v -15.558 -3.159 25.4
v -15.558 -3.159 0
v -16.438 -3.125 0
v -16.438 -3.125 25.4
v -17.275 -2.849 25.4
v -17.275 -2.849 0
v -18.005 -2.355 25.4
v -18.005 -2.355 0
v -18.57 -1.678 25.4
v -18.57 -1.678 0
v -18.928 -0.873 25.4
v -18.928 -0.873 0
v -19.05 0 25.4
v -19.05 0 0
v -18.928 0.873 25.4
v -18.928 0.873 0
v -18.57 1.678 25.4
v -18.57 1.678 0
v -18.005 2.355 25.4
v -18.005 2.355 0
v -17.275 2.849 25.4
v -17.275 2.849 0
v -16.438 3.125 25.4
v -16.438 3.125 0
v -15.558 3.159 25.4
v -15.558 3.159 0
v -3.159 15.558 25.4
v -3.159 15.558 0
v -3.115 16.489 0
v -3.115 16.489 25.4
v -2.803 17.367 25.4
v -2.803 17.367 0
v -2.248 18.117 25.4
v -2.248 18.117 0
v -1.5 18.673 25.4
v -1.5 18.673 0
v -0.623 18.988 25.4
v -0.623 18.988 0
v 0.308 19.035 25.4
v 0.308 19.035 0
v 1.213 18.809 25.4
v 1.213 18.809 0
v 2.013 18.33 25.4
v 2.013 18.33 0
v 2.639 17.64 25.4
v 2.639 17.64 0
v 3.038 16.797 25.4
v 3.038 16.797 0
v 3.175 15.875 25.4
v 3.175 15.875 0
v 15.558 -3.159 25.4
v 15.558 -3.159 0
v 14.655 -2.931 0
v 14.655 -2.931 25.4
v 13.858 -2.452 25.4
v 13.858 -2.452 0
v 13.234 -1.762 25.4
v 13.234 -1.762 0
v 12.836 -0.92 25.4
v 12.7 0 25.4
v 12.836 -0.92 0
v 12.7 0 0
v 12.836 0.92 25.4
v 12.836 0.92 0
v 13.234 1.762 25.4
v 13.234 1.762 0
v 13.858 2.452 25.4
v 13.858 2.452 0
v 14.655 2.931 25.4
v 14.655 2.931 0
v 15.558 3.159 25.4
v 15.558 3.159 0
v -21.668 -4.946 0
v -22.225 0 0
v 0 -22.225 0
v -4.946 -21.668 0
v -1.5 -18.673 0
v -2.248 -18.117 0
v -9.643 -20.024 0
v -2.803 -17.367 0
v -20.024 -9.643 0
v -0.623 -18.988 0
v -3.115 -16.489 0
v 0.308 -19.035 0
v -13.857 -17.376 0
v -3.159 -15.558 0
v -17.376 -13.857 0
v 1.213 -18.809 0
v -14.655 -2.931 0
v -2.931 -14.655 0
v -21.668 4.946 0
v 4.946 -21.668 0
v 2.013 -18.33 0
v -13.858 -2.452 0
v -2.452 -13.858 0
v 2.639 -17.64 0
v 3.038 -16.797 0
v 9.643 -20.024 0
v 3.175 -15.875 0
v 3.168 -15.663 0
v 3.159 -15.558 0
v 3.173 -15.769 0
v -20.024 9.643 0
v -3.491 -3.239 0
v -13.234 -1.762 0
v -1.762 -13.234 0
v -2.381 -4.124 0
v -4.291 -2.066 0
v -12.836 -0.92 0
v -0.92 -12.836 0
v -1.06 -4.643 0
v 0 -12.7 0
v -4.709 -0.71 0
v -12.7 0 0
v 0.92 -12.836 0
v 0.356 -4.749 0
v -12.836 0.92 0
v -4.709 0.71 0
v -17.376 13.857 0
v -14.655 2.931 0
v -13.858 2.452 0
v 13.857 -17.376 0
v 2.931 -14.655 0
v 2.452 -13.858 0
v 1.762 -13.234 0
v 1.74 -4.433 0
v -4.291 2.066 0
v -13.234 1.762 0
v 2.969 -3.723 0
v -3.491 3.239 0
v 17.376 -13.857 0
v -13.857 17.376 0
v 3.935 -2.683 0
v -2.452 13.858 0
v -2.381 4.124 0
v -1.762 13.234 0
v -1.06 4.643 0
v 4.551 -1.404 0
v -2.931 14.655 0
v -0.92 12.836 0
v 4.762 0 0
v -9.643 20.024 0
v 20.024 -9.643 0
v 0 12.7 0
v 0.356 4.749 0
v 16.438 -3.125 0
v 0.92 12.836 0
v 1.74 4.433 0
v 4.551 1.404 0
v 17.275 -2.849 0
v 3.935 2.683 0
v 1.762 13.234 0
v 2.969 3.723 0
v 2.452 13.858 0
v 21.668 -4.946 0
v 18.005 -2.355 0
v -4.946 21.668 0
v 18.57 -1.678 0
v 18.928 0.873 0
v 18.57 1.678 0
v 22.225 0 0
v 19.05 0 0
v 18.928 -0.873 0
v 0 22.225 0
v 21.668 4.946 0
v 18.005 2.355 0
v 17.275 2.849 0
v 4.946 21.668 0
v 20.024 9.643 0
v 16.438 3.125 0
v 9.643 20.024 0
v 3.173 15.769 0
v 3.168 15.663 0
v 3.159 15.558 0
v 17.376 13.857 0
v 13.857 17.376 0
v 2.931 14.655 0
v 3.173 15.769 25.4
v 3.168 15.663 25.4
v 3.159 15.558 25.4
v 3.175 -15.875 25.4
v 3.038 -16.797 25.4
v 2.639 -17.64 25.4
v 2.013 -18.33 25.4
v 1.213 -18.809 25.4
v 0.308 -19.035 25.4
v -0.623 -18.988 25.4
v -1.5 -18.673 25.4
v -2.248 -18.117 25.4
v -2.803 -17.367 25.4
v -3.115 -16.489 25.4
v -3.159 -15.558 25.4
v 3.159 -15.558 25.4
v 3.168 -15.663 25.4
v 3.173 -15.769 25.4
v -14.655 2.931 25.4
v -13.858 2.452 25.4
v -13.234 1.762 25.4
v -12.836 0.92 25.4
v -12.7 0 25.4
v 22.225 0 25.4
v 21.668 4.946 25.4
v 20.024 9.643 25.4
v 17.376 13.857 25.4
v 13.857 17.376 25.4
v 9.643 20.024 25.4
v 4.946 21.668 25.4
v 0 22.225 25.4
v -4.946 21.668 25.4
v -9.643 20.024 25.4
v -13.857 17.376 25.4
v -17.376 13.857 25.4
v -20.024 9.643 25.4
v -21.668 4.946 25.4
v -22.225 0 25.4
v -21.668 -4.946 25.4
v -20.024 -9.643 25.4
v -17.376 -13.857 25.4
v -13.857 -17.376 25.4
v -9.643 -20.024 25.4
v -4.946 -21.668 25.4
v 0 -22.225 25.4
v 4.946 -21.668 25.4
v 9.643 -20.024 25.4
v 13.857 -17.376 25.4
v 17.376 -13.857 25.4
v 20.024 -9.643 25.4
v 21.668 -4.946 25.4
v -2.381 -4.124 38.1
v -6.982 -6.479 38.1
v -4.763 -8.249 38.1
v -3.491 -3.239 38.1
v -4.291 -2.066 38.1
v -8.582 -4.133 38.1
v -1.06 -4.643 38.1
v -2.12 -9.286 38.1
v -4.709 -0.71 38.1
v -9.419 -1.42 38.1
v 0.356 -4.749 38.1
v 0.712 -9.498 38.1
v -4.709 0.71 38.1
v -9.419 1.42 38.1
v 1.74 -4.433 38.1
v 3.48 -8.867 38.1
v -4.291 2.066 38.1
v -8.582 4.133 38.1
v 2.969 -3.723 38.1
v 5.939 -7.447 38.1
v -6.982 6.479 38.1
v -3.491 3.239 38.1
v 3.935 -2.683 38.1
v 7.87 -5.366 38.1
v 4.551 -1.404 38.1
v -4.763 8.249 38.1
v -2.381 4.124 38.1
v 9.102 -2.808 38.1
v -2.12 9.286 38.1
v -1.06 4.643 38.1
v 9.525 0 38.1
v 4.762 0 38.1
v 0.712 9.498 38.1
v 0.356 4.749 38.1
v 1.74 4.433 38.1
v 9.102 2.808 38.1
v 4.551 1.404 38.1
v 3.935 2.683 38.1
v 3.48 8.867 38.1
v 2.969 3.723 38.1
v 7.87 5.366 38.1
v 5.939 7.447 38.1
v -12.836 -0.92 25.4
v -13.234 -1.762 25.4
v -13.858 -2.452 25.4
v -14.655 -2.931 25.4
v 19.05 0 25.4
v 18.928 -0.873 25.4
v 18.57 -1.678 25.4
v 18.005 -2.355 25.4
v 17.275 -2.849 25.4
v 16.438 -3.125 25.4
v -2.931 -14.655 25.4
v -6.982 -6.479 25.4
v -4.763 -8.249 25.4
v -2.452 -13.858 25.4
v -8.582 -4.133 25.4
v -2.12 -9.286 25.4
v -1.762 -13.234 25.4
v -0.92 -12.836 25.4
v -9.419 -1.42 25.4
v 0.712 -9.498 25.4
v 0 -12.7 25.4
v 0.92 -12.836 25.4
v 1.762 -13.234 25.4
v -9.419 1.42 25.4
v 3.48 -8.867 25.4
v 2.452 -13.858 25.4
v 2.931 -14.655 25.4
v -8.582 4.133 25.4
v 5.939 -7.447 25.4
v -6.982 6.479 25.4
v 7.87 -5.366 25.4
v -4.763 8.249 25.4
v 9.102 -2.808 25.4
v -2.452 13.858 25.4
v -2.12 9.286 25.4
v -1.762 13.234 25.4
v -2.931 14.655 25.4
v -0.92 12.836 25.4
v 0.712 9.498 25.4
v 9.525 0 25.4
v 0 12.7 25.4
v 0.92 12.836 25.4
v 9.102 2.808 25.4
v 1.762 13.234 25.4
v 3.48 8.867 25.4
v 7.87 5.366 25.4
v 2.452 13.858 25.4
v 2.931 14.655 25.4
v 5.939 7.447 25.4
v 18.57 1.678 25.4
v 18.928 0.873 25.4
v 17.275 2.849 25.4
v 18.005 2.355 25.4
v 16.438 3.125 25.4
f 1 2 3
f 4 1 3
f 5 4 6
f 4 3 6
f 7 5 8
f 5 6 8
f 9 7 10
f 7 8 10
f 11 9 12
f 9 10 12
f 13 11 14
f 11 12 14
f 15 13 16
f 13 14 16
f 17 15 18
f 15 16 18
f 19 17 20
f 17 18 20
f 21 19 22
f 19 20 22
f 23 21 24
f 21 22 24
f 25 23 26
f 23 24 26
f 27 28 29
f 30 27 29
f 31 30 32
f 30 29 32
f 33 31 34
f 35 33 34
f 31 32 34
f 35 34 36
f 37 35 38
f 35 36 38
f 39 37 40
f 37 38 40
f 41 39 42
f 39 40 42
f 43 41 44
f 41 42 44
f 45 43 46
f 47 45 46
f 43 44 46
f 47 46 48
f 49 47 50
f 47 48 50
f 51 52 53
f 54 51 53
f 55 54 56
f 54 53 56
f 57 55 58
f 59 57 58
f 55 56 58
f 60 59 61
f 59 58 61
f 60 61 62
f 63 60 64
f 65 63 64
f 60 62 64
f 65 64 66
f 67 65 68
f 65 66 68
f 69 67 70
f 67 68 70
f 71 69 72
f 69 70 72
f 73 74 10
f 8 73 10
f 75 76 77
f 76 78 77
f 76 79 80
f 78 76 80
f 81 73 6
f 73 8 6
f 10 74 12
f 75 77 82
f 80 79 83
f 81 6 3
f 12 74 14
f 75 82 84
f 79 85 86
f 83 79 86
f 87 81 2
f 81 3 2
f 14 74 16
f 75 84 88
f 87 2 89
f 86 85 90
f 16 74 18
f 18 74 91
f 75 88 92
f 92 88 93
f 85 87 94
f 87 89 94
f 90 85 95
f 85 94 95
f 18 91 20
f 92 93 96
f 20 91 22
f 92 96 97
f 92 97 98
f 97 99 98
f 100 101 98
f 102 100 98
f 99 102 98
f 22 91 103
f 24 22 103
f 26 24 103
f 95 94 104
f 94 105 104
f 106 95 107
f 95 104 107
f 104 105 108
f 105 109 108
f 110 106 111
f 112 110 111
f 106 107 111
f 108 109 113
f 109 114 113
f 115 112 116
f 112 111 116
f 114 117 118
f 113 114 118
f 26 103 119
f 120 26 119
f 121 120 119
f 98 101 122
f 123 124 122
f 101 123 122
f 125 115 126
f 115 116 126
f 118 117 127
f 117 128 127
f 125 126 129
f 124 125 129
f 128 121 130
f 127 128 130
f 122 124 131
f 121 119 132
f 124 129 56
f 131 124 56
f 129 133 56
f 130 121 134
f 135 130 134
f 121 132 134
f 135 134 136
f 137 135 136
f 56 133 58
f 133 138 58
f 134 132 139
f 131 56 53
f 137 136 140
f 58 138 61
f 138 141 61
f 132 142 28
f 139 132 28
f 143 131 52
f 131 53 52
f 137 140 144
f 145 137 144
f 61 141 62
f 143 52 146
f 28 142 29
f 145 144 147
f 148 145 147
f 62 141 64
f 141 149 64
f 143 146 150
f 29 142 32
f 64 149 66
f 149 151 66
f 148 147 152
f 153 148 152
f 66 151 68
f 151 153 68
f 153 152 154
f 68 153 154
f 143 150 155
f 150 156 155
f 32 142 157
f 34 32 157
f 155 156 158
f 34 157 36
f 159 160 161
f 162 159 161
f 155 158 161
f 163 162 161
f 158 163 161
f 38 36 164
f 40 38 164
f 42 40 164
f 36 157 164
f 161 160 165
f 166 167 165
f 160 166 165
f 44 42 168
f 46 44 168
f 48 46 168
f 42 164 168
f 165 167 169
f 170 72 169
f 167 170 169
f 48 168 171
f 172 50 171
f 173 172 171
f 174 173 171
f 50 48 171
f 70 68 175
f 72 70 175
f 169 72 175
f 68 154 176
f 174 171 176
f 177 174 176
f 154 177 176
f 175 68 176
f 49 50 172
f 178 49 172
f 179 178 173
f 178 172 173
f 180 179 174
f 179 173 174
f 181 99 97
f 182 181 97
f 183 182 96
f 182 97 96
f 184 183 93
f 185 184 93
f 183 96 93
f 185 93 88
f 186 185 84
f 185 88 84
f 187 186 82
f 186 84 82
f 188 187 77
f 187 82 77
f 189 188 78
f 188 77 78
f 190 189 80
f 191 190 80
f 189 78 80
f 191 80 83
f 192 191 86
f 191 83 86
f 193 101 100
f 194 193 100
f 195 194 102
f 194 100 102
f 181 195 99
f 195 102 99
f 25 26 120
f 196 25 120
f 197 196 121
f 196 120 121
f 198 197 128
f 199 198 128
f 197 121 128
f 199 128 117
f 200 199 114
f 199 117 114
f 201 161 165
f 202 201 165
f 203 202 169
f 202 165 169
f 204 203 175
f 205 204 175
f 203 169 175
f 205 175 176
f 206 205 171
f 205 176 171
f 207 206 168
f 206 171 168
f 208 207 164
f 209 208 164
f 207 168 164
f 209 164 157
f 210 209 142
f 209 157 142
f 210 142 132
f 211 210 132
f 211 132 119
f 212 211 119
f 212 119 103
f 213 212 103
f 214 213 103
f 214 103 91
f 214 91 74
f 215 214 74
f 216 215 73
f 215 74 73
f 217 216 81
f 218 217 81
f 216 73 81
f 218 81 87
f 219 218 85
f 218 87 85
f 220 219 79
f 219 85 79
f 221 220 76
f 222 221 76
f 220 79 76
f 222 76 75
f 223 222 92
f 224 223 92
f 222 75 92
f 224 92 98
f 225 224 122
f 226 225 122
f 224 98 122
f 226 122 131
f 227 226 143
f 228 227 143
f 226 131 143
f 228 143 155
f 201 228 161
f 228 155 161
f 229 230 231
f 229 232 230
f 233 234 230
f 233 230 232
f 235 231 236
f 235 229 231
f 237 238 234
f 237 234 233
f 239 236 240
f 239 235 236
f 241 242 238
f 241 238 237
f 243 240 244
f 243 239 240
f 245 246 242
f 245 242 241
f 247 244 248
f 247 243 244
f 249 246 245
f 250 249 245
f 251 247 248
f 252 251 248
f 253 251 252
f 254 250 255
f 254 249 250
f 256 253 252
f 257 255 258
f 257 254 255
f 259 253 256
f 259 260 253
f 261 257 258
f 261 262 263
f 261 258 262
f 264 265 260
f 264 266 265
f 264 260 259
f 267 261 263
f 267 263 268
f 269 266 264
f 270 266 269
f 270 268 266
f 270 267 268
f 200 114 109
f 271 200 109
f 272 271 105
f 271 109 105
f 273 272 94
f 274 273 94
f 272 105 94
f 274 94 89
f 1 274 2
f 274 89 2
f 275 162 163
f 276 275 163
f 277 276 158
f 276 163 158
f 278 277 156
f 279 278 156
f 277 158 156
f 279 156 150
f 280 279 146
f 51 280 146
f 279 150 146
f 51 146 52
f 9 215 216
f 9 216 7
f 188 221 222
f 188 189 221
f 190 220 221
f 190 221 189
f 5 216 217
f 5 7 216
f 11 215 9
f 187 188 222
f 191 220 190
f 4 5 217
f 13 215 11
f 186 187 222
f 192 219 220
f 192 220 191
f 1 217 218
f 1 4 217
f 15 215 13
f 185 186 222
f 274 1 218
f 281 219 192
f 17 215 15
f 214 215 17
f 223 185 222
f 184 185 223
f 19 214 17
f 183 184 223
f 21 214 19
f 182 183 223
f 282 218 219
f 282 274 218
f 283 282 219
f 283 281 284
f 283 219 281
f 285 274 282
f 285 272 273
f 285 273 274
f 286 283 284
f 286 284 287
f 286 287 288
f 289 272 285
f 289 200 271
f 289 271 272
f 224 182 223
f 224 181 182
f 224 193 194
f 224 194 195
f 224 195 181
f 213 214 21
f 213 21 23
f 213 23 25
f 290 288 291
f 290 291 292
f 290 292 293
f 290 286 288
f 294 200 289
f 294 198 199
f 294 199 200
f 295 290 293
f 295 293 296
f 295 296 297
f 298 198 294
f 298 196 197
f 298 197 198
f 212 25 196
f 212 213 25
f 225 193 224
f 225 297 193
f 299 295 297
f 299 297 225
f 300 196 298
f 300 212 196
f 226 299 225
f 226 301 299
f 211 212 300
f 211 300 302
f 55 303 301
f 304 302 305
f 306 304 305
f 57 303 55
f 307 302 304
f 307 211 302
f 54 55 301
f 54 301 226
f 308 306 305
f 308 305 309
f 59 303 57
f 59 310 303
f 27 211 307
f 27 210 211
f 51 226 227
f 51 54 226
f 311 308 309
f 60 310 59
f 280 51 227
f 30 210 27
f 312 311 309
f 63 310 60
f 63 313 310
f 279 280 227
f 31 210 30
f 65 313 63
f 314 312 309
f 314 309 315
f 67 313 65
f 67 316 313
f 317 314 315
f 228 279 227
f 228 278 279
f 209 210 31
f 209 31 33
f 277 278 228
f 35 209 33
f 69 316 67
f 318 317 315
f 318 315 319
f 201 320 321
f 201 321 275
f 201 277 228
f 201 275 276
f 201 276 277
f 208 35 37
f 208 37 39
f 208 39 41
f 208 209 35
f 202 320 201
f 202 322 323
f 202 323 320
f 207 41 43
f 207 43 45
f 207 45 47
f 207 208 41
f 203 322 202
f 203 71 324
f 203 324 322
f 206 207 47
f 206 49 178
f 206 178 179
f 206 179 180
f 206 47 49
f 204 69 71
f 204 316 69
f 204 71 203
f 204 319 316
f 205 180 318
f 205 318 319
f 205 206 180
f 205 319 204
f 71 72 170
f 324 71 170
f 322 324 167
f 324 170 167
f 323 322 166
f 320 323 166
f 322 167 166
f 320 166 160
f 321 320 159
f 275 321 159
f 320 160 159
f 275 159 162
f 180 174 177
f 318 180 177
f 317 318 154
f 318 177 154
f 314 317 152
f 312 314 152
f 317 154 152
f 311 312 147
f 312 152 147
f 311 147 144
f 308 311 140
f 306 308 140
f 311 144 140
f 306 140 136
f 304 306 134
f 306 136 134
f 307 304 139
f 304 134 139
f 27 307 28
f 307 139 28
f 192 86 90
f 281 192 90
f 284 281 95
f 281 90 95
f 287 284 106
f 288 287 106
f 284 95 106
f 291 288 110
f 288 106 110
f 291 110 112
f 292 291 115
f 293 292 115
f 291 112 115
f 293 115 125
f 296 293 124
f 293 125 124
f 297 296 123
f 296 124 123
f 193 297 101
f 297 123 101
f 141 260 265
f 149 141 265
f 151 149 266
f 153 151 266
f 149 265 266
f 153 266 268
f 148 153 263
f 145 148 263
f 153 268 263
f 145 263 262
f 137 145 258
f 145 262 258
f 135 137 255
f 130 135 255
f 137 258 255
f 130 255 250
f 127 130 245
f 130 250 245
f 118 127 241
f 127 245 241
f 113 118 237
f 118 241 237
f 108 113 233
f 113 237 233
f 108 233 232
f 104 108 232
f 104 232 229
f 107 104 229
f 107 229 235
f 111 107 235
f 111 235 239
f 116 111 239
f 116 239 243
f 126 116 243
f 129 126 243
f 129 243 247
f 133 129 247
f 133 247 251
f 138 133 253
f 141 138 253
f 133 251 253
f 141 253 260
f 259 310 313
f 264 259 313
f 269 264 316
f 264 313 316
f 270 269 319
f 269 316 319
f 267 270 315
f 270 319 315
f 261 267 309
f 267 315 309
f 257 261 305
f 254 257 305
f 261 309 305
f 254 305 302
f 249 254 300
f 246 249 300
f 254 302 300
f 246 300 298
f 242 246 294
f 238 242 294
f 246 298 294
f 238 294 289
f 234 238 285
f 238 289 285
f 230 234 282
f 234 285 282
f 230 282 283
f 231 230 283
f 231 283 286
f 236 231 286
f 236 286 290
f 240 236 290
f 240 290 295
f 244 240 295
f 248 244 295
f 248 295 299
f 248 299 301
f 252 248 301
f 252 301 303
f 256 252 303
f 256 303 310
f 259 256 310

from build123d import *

# Parameters (mm, degrees)
F0_R     = 22.225
F0_R_2   = 9.525
F1_DEPTH = 25.4
F0_R_3   = 4.7625
F2_DEPTH = 38.1
F3_R     = 4.7625
F4_DEPTH = 38.1


with BuildPart() as f1:
    # F0 (on Top) → F1 (new body)
    with BuildSketch(Plane.XY):
        Circle(F0_R)
        with BuildLine():
            ThreePointArc((3.159085, 15.5575), (11.22532, 11.22532), (15.5575, 3.159085))
            ThreePointArc((15.5575, 3.159085), (18.004855, 2.354643), (19.05, 0))
            ThreePointArc((19.05, 0), (18.004855, -2.354643), (15.5575, -3.159085))
            ThreePointArc((15.5575, -3.159085), (11.22532, -11.22532), (3.159085, -15.5575))
            ThreePointArc((3.159085, -15.5575), (3.171019, -15.716051), (3.175, -15.875))
            ThreePointArc((3.175, -15.875), (-0.158949, -19.046019), (-3.159085, -15.5575))
            ThreePointArc((-3.159085, -15.5575), (-11.22532, -11.22532), (-15.5575, -3.159085))
            ThreePointArc((-15.5575, -3.159085), (-19.05, 0), (-15.5575, 3.159085))
            ThreePointArc((-15.5575, 3.159085), (-11.22532, 11.22532), (-3.159085, 15.5575))
            ThreePointArc((-3.159085, 15.5575), (-0.158949, 19.046019), (3.175, 15.875))
            ThreePointArc((3.175, 15.875), (3.171019, 15.716051), (3.159085, 15.5575))
        make_face(mode=Mode.SUBTRACT)
        with BuildLine():
            ThreePointArc((15.5575, -3.159085), (12.7, 0), (15.5575, 3.159085))
            ThreePointArc((15.5575, 3.159085), (11.22532, 11.22532), (3.159085, 15.5575))
            ThreePointArc((3.159085, 15.5575), (0, 12.7), (-3.159085, 15.5575))
            ThreePointArc((-3.159085, 15.5575), (-11.22532, 11.22532), (-15.5575, 3.159085))
            ThreePointArc((-15.5575, 3.159085), (-13.520357, 2.129855), (-12.7, 0))
            ThreePointArc((-12.7, 0), (-13.520357, -2.129855), (-15.5575, -3.159085))
            ThreePointArc((-15.5575, -3.159085), (-11.22532, -11.22532), (-3.159085, -15.5575))
            ThreePointArc((-3.159085, -15.5575), (0, -12.7), (3.159085, -15.5575))
            ThreePointArc((3.159085, -15.5575), (11.22532, -11.22532), (15.5575, -3.159085))
        make_face()
        Circle(F0_R_2, mode=Mode.SUBTRACT)
    extrude(amount=F1_DEPTH)

    # F0 (on Top) → F2 (join)
    with BuildSketch(Plane.XY):
        Circle(F0_R_2)
        Circle(F0_R_3, mode=Mode.SUBTRACT)
        Circle(F0_R_3)
    extrude(amount=F2_DEPTH)

    # F3 (on face) → F4 (cut)
    with BuildSketch(Plane.XY.offset(38.1)):
        Circle(F3_R)
    extrude(amount=-F4_DEPTH, mode=Mode.SUBTRACT)


solid = f1.part
